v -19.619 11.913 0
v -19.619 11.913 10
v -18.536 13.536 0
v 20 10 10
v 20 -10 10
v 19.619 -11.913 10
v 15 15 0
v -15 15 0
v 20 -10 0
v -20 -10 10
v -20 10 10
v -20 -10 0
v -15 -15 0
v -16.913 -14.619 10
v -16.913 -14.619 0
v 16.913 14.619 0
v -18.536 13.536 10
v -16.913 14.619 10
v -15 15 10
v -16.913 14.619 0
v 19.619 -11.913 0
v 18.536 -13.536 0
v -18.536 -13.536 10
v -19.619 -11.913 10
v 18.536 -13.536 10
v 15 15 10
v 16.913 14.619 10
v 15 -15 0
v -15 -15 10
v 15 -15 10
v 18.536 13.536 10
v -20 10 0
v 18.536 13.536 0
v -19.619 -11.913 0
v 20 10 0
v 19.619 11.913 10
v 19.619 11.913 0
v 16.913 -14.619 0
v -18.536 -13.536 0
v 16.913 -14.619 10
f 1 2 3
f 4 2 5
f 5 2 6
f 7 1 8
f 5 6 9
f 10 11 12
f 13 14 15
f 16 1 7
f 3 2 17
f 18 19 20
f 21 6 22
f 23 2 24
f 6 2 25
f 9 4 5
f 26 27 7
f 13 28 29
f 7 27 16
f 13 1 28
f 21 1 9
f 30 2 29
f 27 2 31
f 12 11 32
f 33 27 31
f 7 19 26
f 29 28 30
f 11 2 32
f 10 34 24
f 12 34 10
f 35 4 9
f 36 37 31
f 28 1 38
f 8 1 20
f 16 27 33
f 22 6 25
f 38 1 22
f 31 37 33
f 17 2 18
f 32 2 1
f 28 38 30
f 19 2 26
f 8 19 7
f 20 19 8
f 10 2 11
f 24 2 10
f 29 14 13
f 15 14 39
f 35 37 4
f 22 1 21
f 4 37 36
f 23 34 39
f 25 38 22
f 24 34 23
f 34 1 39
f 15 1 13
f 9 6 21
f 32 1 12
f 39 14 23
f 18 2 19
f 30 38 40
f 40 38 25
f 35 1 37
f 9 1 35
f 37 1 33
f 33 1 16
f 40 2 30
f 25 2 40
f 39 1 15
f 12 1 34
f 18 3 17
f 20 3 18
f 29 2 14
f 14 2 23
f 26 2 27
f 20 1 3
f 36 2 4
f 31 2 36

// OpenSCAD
/*
  Author: Johannes Bayer, 2025
  License: MIT
  Description: Helper Function to generate a cuboid with rounded side corners
*/

module base_plate(width, depth, thickness, corner_radius=0){
    
    translate([corner_radius-depth/2,corner_radius-width/2,0])
        minkowski(){
            cube([depth-corner_radius*2,
                  width-corner_radius*2,
                  thickness-1]);
            cylinder(r=corner_radius,h=1);
            }
}


// Sample Usage
base_plate(30,40,10,5);
